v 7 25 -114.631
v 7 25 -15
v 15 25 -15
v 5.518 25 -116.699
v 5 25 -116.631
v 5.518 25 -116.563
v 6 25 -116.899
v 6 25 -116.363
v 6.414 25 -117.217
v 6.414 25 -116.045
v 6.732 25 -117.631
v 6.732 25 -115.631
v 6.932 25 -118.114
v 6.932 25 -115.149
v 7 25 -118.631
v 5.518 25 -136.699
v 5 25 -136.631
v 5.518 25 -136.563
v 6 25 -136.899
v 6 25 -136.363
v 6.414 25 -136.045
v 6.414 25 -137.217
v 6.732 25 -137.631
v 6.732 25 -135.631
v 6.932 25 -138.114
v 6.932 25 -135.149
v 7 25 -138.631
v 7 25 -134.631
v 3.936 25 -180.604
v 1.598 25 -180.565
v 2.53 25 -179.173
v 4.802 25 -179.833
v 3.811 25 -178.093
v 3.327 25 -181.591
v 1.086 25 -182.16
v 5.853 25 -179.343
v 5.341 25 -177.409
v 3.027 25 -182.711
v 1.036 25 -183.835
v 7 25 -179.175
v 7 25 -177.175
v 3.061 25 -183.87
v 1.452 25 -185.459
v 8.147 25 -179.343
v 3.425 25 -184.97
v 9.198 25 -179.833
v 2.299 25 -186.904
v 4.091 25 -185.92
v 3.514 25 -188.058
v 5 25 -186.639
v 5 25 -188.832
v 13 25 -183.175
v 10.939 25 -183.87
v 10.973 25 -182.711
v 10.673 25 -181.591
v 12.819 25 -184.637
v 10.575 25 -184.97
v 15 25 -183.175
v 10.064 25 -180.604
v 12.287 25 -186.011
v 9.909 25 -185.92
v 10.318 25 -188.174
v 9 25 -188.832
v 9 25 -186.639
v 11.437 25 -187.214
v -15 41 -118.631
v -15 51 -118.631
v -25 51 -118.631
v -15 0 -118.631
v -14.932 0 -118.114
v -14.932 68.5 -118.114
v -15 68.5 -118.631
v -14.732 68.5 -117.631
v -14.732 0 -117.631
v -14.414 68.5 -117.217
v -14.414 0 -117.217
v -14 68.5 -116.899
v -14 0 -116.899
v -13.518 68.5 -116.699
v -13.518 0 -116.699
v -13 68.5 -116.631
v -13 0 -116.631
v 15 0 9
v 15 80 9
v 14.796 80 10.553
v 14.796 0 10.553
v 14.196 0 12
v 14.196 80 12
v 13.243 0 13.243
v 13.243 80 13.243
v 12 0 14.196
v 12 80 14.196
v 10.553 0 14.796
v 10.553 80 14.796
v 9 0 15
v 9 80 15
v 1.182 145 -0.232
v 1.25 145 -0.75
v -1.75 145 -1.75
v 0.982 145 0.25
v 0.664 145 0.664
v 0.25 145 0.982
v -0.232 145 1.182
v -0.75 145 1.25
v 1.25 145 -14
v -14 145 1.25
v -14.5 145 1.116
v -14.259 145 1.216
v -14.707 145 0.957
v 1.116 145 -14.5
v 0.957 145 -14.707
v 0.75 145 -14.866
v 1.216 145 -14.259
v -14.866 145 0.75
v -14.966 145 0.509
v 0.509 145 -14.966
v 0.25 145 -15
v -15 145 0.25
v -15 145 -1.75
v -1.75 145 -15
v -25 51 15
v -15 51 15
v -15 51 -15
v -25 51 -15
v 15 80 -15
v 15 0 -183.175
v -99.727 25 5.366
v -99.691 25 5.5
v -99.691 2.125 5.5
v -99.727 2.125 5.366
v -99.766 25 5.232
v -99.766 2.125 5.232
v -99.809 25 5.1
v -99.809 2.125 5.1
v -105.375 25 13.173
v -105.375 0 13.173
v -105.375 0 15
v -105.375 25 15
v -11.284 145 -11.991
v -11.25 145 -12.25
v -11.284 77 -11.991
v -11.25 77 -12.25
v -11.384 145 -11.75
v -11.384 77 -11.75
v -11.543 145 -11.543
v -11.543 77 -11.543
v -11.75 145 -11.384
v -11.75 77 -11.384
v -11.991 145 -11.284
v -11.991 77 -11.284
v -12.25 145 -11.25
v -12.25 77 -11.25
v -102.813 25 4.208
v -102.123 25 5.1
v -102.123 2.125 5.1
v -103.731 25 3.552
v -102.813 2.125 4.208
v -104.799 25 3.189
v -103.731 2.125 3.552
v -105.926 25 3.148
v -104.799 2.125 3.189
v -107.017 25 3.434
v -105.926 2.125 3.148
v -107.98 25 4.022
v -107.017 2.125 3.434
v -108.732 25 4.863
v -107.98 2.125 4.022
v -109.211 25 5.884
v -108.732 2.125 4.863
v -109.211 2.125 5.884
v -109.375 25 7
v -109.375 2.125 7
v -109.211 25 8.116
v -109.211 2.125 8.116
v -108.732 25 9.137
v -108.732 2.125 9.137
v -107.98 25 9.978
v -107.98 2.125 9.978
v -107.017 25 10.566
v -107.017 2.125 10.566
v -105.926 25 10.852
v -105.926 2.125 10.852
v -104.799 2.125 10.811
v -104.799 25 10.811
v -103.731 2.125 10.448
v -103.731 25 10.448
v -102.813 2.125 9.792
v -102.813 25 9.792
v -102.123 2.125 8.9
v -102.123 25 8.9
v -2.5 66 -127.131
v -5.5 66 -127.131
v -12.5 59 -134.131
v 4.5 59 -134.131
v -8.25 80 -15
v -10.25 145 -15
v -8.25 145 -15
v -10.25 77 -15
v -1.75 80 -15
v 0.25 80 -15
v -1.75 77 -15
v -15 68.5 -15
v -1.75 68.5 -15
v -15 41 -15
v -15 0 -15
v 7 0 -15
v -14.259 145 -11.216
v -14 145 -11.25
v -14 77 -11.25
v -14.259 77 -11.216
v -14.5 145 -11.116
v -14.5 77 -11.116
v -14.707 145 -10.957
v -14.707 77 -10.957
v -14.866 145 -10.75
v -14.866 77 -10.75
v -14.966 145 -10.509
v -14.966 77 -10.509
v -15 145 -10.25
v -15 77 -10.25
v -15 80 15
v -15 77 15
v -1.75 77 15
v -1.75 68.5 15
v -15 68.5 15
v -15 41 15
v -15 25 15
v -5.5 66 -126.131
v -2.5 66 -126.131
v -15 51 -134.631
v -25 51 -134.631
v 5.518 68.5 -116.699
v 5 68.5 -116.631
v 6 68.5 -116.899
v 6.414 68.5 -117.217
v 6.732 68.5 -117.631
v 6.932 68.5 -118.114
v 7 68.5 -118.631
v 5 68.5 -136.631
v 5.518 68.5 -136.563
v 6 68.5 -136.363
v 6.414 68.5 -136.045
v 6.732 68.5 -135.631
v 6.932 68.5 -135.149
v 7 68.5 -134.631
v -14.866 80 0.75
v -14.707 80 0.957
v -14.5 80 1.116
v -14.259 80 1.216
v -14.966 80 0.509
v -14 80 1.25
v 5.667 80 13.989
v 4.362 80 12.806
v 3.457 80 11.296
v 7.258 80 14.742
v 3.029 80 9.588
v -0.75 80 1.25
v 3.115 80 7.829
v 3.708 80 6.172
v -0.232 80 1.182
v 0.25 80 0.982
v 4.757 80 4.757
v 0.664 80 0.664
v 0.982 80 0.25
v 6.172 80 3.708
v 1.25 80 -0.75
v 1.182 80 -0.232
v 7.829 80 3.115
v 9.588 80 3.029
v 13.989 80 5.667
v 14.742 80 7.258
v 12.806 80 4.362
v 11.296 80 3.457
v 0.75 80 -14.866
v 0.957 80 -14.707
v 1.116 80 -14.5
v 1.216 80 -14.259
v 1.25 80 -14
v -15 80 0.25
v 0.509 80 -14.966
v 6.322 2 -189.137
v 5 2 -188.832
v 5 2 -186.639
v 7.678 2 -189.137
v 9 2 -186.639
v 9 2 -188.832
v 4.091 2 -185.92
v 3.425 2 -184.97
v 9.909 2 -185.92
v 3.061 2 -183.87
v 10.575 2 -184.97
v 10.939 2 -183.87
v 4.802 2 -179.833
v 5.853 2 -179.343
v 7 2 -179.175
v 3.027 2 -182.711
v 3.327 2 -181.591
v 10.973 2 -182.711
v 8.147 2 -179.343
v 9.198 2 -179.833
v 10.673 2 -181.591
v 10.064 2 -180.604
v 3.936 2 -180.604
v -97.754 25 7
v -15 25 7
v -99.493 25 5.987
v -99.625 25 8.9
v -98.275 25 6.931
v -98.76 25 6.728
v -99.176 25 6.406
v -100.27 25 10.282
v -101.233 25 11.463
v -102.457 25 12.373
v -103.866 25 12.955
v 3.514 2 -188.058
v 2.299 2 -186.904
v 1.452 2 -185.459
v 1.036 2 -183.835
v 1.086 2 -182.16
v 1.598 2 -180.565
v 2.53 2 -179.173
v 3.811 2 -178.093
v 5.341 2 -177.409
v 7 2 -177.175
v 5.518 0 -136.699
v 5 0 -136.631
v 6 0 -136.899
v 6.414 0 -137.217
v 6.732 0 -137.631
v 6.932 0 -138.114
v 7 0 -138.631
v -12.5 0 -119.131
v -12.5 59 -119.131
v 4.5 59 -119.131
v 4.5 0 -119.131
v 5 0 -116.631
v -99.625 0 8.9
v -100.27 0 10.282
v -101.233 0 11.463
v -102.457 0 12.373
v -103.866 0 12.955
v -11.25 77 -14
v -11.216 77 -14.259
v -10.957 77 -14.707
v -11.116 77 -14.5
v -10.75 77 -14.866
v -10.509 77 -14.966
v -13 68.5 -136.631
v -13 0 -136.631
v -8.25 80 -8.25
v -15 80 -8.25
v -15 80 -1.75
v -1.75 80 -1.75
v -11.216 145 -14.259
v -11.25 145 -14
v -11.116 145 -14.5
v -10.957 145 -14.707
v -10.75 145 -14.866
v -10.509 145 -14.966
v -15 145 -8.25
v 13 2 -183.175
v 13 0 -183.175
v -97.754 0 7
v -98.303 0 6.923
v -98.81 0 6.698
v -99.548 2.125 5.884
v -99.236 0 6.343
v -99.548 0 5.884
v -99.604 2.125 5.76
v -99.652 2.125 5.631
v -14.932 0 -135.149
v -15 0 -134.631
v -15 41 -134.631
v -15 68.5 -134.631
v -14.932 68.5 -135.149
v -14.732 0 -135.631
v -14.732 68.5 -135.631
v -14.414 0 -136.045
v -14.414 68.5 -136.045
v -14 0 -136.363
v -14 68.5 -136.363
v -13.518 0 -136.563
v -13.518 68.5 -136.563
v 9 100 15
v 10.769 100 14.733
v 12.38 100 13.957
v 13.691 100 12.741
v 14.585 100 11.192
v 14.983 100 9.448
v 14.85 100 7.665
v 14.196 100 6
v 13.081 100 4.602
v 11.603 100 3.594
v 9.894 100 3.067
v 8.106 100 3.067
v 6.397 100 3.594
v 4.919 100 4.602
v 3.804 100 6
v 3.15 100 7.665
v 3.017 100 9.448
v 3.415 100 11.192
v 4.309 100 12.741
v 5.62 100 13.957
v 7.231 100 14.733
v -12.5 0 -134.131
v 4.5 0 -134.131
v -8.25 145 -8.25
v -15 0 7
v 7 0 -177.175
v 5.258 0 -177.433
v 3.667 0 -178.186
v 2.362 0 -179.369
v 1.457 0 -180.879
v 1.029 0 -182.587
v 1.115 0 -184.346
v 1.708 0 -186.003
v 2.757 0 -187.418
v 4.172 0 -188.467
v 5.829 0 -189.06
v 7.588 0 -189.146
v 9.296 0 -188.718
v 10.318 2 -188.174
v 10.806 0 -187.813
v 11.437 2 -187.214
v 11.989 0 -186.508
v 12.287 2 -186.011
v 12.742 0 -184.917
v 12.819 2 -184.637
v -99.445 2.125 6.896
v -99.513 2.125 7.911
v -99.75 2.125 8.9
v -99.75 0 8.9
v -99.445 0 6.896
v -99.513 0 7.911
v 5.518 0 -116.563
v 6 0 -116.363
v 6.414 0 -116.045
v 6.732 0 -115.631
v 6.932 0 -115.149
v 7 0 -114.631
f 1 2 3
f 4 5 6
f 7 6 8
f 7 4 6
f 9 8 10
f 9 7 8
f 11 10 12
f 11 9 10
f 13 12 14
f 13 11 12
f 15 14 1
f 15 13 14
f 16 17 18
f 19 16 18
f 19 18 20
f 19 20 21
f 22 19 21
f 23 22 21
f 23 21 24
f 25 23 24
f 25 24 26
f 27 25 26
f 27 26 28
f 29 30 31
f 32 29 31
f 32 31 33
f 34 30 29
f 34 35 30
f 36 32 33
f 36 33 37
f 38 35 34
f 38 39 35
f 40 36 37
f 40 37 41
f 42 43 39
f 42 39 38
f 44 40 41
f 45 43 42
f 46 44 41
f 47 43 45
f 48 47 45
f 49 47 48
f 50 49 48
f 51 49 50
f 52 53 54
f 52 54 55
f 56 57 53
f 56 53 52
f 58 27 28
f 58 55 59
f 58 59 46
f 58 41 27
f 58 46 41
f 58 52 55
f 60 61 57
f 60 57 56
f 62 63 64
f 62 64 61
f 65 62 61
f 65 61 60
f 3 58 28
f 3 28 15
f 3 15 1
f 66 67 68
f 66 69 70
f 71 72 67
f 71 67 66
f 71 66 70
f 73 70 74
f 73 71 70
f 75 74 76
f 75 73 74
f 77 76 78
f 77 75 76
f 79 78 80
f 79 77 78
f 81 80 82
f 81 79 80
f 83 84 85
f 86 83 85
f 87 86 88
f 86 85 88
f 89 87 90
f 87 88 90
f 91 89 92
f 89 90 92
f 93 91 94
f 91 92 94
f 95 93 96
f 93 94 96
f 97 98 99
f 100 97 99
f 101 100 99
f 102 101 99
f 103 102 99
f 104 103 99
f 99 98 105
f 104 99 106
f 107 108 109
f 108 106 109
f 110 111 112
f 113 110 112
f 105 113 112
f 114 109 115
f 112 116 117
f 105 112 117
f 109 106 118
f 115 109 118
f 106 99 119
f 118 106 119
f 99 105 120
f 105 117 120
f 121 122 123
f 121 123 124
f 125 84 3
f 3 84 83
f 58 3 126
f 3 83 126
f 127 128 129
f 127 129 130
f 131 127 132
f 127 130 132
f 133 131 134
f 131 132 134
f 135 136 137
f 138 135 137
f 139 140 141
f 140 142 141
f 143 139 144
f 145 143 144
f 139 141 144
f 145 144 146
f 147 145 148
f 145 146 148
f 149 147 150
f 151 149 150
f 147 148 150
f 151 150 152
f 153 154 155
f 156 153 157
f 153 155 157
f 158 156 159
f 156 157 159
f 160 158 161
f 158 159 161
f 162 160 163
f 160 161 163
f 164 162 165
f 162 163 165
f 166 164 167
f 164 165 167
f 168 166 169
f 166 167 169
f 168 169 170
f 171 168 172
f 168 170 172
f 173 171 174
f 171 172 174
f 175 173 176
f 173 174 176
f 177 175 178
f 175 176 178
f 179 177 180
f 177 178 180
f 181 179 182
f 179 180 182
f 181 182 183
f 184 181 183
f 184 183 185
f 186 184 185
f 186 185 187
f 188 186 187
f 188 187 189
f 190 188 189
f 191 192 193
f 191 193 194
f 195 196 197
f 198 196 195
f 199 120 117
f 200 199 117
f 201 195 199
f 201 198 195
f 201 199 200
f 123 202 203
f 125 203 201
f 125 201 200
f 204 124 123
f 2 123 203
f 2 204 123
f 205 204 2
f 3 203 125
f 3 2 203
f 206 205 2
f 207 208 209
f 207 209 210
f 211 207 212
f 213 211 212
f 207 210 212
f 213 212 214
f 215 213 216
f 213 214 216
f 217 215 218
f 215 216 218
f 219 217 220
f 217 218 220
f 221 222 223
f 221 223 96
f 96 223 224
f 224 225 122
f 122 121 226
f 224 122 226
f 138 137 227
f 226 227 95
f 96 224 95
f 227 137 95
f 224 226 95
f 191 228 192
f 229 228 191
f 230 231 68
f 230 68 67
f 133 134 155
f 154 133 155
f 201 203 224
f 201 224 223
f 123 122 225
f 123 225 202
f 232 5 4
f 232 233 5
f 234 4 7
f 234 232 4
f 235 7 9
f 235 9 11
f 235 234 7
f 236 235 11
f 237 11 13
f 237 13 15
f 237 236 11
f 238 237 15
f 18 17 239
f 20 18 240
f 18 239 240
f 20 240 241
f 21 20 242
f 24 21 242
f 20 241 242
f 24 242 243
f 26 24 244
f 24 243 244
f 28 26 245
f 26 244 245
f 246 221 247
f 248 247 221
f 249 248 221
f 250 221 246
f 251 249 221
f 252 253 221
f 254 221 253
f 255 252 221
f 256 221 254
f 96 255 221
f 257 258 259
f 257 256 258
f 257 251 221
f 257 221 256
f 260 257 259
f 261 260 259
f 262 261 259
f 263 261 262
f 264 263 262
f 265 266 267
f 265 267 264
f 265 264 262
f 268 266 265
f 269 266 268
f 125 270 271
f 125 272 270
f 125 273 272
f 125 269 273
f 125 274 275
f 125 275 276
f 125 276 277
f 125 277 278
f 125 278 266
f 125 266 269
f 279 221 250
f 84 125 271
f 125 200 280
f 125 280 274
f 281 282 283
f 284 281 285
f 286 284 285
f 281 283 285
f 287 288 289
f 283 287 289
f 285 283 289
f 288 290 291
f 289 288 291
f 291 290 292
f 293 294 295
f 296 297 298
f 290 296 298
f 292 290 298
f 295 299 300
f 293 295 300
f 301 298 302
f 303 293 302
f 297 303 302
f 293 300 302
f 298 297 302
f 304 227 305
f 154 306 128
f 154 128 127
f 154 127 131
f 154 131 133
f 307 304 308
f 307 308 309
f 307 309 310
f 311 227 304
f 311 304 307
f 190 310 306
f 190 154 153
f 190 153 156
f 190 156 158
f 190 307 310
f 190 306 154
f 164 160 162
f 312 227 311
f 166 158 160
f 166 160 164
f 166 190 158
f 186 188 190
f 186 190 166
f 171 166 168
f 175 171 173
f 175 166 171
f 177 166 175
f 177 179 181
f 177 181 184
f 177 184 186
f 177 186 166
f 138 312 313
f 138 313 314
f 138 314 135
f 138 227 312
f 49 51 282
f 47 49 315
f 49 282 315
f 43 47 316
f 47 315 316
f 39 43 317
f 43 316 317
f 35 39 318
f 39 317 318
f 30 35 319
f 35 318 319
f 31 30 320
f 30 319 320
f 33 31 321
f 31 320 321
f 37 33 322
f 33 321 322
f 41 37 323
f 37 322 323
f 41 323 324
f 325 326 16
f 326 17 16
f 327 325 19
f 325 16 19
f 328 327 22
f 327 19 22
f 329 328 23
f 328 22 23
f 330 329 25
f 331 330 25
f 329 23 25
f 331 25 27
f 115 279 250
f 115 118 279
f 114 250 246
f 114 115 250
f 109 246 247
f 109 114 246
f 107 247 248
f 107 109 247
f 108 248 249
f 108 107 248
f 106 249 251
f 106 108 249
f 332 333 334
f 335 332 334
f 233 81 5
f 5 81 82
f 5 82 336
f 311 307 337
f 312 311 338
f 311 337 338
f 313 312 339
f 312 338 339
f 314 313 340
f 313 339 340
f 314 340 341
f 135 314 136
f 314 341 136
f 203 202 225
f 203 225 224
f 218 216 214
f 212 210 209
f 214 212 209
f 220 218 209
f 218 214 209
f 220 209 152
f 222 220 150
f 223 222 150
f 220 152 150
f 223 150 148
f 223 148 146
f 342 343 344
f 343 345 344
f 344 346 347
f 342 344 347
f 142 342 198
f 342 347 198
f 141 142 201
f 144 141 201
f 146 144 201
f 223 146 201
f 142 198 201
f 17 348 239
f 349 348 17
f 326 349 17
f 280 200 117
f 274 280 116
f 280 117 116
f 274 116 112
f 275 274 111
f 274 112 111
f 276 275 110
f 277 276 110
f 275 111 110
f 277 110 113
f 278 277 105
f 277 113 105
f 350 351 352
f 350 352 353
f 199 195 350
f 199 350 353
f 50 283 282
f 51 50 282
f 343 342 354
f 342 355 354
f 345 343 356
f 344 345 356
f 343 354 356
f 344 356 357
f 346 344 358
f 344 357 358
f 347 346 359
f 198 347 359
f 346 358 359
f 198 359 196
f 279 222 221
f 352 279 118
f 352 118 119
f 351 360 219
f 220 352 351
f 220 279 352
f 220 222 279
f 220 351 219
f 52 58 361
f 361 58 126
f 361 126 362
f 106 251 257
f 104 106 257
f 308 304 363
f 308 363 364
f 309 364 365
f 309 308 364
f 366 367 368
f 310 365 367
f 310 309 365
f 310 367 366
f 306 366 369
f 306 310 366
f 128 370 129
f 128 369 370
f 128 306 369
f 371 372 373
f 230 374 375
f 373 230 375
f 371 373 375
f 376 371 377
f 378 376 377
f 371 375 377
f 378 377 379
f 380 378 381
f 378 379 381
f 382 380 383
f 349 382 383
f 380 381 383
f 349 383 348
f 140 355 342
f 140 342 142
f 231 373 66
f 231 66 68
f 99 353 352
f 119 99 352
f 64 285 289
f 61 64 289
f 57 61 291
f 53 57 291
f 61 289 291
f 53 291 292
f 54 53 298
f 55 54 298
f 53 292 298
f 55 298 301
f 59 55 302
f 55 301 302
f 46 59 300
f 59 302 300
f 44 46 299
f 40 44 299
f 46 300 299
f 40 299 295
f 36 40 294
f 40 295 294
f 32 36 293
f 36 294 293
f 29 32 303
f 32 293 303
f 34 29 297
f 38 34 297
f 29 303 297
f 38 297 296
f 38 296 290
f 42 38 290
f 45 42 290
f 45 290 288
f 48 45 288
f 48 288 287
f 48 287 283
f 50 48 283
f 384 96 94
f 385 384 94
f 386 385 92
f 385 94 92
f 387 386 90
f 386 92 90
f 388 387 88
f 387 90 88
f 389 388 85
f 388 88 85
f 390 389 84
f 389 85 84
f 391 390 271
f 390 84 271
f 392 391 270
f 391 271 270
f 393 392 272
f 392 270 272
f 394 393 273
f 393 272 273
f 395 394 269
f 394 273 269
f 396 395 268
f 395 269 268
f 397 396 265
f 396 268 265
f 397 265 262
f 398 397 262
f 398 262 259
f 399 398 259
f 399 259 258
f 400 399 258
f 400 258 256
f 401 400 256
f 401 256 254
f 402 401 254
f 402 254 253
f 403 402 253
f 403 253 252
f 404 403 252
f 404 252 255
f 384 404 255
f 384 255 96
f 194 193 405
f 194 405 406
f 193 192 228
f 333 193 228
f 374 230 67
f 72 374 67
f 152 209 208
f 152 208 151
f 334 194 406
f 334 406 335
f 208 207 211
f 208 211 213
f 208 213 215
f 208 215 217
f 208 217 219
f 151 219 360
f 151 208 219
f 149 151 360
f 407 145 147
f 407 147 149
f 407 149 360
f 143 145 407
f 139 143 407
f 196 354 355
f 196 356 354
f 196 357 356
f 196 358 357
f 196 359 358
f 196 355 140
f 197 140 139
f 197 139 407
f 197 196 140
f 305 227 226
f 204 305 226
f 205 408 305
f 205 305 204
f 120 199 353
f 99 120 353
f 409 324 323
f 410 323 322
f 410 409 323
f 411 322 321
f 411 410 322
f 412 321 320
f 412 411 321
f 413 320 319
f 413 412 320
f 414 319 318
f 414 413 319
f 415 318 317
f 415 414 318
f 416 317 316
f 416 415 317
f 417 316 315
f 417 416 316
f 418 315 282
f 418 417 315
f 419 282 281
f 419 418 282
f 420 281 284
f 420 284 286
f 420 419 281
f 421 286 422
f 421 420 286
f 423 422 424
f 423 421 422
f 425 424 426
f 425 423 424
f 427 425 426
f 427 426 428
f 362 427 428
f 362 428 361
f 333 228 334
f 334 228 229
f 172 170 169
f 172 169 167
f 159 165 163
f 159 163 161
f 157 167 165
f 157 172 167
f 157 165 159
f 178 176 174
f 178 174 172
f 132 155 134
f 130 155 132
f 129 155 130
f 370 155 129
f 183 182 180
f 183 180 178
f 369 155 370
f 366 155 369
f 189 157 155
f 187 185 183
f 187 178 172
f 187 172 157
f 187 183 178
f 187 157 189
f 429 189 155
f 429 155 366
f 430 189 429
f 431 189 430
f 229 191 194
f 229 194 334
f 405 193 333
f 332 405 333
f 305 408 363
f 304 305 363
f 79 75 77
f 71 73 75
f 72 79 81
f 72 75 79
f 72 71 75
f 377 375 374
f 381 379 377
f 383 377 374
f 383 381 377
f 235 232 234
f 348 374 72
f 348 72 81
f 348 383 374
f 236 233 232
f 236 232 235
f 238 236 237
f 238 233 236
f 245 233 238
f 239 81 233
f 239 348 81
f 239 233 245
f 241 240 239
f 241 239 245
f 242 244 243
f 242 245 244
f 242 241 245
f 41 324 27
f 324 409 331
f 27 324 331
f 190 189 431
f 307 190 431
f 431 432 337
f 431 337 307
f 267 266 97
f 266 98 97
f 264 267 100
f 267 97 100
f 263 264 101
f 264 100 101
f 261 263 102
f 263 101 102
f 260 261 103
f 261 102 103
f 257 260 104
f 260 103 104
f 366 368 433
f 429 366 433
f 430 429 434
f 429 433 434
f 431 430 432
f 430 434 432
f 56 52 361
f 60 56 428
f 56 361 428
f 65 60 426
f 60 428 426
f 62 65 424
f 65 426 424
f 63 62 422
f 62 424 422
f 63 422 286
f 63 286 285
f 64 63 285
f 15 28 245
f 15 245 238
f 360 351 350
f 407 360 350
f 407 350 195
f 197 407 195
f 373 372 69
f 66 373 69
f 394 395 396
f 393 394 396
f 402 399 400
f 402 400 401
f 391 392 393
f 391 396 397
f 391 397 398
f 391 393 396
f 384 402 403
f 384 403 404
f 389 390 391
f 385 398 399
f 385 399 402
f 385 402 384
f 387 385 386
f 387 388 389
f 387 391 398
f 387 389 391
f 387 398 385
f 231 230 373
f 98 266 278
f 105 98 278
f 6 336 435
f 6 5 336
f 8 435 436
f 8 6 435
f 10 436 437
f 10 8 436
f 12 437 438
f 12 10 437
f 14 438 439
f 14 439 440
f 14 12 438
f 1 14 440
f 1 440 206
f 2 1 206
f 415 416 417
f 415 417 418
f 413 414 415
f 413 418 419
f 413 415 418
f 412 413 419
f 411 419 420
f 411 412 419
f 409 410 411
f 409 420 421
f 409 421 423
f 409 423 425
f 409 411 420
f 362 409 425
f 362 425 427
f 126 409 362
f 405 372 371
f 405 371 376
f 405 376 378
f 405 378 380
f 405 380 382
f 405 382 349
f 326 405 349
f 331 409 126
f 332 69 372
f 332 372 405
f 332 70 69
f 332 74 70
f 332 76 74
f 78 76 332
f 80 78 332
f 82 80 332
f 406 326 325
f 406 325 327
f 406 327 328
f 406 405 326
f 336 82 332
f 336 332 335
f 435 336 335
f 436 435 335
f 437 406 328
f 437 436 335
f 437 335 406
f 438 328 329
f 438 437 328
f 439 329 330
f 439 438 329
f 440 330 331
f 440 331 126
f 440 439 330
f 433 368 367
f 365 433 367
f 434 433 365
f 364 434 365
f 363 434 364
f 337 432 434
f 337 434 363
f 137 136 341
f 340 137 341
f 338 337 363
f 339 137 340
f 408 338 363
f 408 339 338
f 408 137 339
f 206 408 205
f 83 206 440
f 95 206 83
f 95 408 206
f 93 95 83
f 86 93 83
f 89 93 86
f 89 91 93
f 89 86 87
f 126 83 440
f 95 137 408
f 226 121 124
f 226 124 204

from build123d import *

# Parameters (mm, degrees)
SKETCH1_W                 = 30
SKETCH1_H                 = 30
BOSS_EXTRUDE1_DEPTH       = 80
SKETCH2_R                 = 6
BOSS_EXTRUDE2_DEPTH       = 20
CUT_EXTRUDE1_DEPTH        = 83.764726786
BOSS_EXTRUDE3_DEPTH       = 65
BOSS_EXTRUDE5_DEPTH       = 2
BOSS_EXTRUDE6_DEPTH       = 23
BOSS_EXTRUDE7_DEPTH       = 25
FILLET1_R                 = 2
SKETCH11_R                = 6.055782361
CUT_EXTRUDE2_DEPTH        = 2.125
CUT_EXTRUDE4_DEPTH        = 274.267856233
CUT_EXTRUDE4_DEPTH_BACK   = 274.267856233
SKETCH13_W                = 13.25
SKETCH13_H                = 8.5
FILLET2_R                 = 2
CUT_EXTRUDE6_REACH        = 234.702
SKETCH16_W                = 3.75
SKETCH16_H                = 3.75
FILLET4_R                 = 1
BOSS_EXTRUDE8_REACH       = 264.25
SKETCH17_W                = 22
SKETCH17_H                = 20
SKETCH18_W                = 17
SKETCH18_H                = 15
CUT_EXTRUDE7_DEPTH        = 66
FILLET5_R                 = 2
FILLET6_R                 = 2
CHAMFER1_SIZE             = 7
BOSS_EXTRUDE9_DEPTH       = 30
BOSS_EXTRUDE10_DEPTH      = 8
BOSS_EXTRUDE10_DEPTH_BACK = 8


with BuildPart() as part:
    # Sketch1 → Boss-Extrude1 (new body)
    with BuildSketch(Plane(origin=(0, 0, 0), x_dir=(1, 0, 0), z_dir=(0, 1, 0))):
        Rectangle(SKETCH1_W, SKETCH1_H)
    extrude(amount=BOSS_EXTRUDE1_DEPTH)

    # Sketch2 → Boss-Extrude2 (add)
    with BuildSketch(Plane(origin=(0, 80, 0), x_dir=(1, 0, 0), z_dir=(0, 1, 0))):
        with Locations(Location((9, -9, 0), (0, 0, 270))):
            Circle(SKETCH2_R)
    extrude(amount=BOSS_EXTRUDE2_DEPTH)

    # Sketch3 → Cut-Extrude1 (cut, through all)
    with BuildSketch(Plane(origin=(0, 80, 0), x_dir=(1, 0, 0), z_dir=(0, 1, 0))):
        with BuildLine():
            Line((9, -15), (15, -15))
            Line((15, -15), (15, -9))
            ThreePointArc((15, -9), (13.242640687, -13.242640687), (9, -15))
        make_face()
    extrude(amount=-CUT_EXTRUDE1_DEPTH, mode=Mode.SUBTRACT)

    # Sketch4 → Boss-Extrude3 (add)
    with BuildSketch(Plane(origin=(0, 80, 0), x_dir=(1, 0, 0), z_dir=(0, 1, 0))):
        Polygon((-11.25, 1.75), (-1.75, 1.75), (-1.75, 11.25), (-1.75, 15), (1.25, 15), (1.25, 11.25), (1.25, -1.25), (-11.25, -1.25), (-15, -1.25), (-15, 1.75), align=None)
        Polygon((-11.25, 8.25), (-8.25, 8.25), (-8.25, 11.25), (-8.25, 15), (-11.25, 15), (-11.25, 11.25), (-15, 11.25), (-15, 8.25), align=None)
    extrude(amount=BOSS_EXTRUDE3_DEPTH)

    # Sketch6 → Boss-Extrude5 (add)
    with BuildSketch(Plane.XZ):
        with BuildLine():
            Line((15, -15), (7, -15))
            Line((7, -15), (7, -177.175))
            ThreePointArc((7, -177.175), (2.757359313, -187.417640687), (13, -183.175))
            Line((13, -183.175), (15, -183.175))
            Line((15, -183.175), (15, -15))
        make_face()
    extrude(amount=-BOSS_EXTRUDE5_DEPTH)

    # Sketch7 → Boss-Extrude6 (add)
    with BuildSketch(Plane(origin=(0, 2, 0), x_dir=(1, 0, 0), z_dir=(0, 1, 0))):
        with BuildLine():
            Line((9, 188.831854249), (9, 186.639101615))
            ThreePointArc((9, 186.639101615), (7, 179.175), (5, 186.639101615))
            Line((5, 186.639101615), (5, 188.831854249))
            ThreePointArc((5, 188.831854249), (1.086408642, 182.160388128), (7, 177.175))
            Line((7, 177.175), (7, 15))
            Line((7, 15), (15, 15))
            Line((15, 15), (15, 183.175))
            Line((15, 183.175), (13, 183.175))
            ThreePointArc((13, 183.175), (11.898979486, 186.639101615), (9, 188.831854249))
        make_face()
    extrude(amount=BOSS_EXTRUDE6_DEPTH)

    # Sketch9 → Boss-Extrude7 (add)
    with BuildSketch(Plane.XZ):
        with BuildLine():
            Line((-15, 15), (-15, 7))
            Line((-15, 7), (-99.5, 7))
            ThreePointArc((-99.5, 7), (-99.577697751, 6.037536458), (-99.80877869, 5.1))
            Line((-99.80877869, 5.1), (-102.122778509, 5.1))
            ThreePointArc((-102.122778509, 5.1), (-109.375, 7), (-102.122778509, 8.9))
            Line((-102.122778509, 8.9), (-99.625, 8.9))
            ThreePointArc((-99.625, 8.9), (-101.816885554, 11.955834237), (-105.375001601, 13.173329766))
            Line((-105.375001601, 13.173329766), (-105.375001601, 15))
            Line((-105.375001601, 15), (-15, 15))
        make_face()
    extrude(amount=-BOSS_EXTRUDE7_DEPTH)

    # Fillet1
    fillet1_edges = [part.edges().sort_by_distance(p)[0] for p in [
        (-99.5, 12.5, 7),
    ]]
    fillet(fillet1_edges, radius=FILLET1_R)

    # Sketch11 → Cut-Extrude2 (cut)
    with BuildSketch(Plane.XZ):
        with Locations((-105.5, 7)):
            Circle(SKETCH11_R)
    extrude(amount=-CUT_EXTRUDE2_DEPTH, mode=Mode.SUBTRACT)

    # Sketch13 → Cut-Extrude4 (cut, two sides: drawn at the far end of the back side and taken through both)
    with BuildSketch(Plane.XY.offset(15).offset(-CUT_EXTRUDE4_DEPTH_BACK)):
        with Locations((-8.375, 72.75)):
            Rectangle(SKETCH13_W, SKETCH13_H)
    extrude(amount=CUT_EXTRUDE4_DEPTH + CUT_EXTRUDE4_DEPTH_BACK, mode=Mode.SUBTRACT)

    # Fillet2
    fillet2_edges = [part.edges().sort_by_distance(p)[0] for p in [
        (1.25, 112.5, 1.25),
    ]]
    fillet(fillet2_edges, radius=FILLET2_R)

    # Sketch16 → Cut-Extrude6 (cut, up to next)
    with BuildSketch(Plane(origin=(0, 80, 0), x_dir=(1, 0, 0), z_dir=(0, 1, 0)), mode=Mode.PRIVATE) as cut_extrude6_sk1:
        with Locations((-13.125, 13.125)):
            Rectangle(SKETCH16_W, SKETCH16_H)
    cut_extrude6_tool1 = extrude(cut_extrude6_sk1.sketch, amount=-CUT_EXTRUDE6_REACH, mode=Mode.PRIVATE) & part.part
    add(cut_extrude6_tool1.solids().sort_by_distance((-13.125, 80, -13.125))[0], mode=Mode.SUBTRACT)

    # Fillet4
    fillet4_edges = [part.edges().sort_by_distance(p)[0] for p in [
        (-11.25, 111, -11.25),
        (-15, 111, -11.25),
        (-11.25, 111, -15),
        (-15, 112.5, 1.25),
        (1.25, 112.5, -15),
    ]]
    fillet(fillet4_edges, radius=FILLET4_R)

    # Boss-Extrude8: up to this face of the body (flat: up to its plane)
    boss_extrude8_end = Plane(part.part.faces().sort_by_distance((-8.375, 68.5, 0))[0])
    # Sketch17 → Boss-Extrude8 (add, up to the picked face)
    with BuildSketch(Plane.XZ, mode=Mode.PRIVATE) as boss_extrude8_sk1:
        with Locations((-4, -126.63125)):
            Rectangle(SKETCH17_W, SKETCH17_H)
    boss_extrude8_tool1 = split(extrude(boss_extrude8_sk1.sketch, amount=-BOSS_EXTRUDE8_REACH, mode=Mode.PRIVATE), bisect_by=boss_extrude8_end, keep=Keep.BOTH, mode=Mode.PRIVATE)
    add(boss_extrude8_tool1.solids().sort_by(Axis((-4, 0, -126.63125), (0, 1, 0)))[0])

    # Sketch18 → Cut-Extrude7 (cut)
    with BuildSketch(Plane.XZ):
        with Locations((-4, -126.63125)):
            Rectangle(SKETCH18_W, SKETCH18_H)
    extrude(amount=-CUT_EXTRUDE7_DEPTH, mode=Mode.SUBTRACT)

    # Fillet5
    fillet5_edges = [part.edges().sort_by_distance(p)[0] for p in [
        (7, 12.5, -116.63125),
        (7, 12.5, -136.63125),
        (-15, 34.25, -136.63125),
        (-15, 34.25, -116.63125),
    ]]
    fillet(fillet5_edges, radius=FILLET5_R)

    # Fillet6
    fillet6_edges = [part.edges().sort_by_distance(p)[0] for p in [
        (7, 46.75, -116.63125),
        (7, 46.75, -136.63125),
    ]]
    fillet(fillet6_edges, radius=FILLET6_R)

    # Chamfer1
    chamfer1_edges = [part.edges().sort_by_distance(p)[0] for p in [
        (-12.5, 66, -126.63125),
        (-4, 66, -119.13125),
        (4.5, 66, -126.63125),
        (-4, 66, -134.13125),
    ]]
    chamfer(chamfer1_edges, length=CHAMFER1_SIZE)

    # Sketch19 → Boss-Extrude9 (add)
    with BuildSketch(Plane.XY.offset(15)):
        Polygon((-15, 51), (-25, 51), (-15, 41), align=None)
    extrude(amount=-BOSS_EXTRUDE9_DEPTH)

    # Sketch20 → Boss-Extrude10 (add, two sides: drawn at the far end of the back side and taken through both)
    with BuildSketch(Plane(origin=(0, 0, -126.63125), x_dir=(-1, 0, 0), z_dir=(0, 0, -1)).offset(-BOSS_EXTRUDE10_DEPTH_BACK)):
        Polygon((25, 51), (15, 51), (15, 41), align=None)
    extrude(amount=BOSS_EXTRUDE10_DEPTH + BOSS_EXTRUDE10_DEPTH_BACK)


solid = part.part
